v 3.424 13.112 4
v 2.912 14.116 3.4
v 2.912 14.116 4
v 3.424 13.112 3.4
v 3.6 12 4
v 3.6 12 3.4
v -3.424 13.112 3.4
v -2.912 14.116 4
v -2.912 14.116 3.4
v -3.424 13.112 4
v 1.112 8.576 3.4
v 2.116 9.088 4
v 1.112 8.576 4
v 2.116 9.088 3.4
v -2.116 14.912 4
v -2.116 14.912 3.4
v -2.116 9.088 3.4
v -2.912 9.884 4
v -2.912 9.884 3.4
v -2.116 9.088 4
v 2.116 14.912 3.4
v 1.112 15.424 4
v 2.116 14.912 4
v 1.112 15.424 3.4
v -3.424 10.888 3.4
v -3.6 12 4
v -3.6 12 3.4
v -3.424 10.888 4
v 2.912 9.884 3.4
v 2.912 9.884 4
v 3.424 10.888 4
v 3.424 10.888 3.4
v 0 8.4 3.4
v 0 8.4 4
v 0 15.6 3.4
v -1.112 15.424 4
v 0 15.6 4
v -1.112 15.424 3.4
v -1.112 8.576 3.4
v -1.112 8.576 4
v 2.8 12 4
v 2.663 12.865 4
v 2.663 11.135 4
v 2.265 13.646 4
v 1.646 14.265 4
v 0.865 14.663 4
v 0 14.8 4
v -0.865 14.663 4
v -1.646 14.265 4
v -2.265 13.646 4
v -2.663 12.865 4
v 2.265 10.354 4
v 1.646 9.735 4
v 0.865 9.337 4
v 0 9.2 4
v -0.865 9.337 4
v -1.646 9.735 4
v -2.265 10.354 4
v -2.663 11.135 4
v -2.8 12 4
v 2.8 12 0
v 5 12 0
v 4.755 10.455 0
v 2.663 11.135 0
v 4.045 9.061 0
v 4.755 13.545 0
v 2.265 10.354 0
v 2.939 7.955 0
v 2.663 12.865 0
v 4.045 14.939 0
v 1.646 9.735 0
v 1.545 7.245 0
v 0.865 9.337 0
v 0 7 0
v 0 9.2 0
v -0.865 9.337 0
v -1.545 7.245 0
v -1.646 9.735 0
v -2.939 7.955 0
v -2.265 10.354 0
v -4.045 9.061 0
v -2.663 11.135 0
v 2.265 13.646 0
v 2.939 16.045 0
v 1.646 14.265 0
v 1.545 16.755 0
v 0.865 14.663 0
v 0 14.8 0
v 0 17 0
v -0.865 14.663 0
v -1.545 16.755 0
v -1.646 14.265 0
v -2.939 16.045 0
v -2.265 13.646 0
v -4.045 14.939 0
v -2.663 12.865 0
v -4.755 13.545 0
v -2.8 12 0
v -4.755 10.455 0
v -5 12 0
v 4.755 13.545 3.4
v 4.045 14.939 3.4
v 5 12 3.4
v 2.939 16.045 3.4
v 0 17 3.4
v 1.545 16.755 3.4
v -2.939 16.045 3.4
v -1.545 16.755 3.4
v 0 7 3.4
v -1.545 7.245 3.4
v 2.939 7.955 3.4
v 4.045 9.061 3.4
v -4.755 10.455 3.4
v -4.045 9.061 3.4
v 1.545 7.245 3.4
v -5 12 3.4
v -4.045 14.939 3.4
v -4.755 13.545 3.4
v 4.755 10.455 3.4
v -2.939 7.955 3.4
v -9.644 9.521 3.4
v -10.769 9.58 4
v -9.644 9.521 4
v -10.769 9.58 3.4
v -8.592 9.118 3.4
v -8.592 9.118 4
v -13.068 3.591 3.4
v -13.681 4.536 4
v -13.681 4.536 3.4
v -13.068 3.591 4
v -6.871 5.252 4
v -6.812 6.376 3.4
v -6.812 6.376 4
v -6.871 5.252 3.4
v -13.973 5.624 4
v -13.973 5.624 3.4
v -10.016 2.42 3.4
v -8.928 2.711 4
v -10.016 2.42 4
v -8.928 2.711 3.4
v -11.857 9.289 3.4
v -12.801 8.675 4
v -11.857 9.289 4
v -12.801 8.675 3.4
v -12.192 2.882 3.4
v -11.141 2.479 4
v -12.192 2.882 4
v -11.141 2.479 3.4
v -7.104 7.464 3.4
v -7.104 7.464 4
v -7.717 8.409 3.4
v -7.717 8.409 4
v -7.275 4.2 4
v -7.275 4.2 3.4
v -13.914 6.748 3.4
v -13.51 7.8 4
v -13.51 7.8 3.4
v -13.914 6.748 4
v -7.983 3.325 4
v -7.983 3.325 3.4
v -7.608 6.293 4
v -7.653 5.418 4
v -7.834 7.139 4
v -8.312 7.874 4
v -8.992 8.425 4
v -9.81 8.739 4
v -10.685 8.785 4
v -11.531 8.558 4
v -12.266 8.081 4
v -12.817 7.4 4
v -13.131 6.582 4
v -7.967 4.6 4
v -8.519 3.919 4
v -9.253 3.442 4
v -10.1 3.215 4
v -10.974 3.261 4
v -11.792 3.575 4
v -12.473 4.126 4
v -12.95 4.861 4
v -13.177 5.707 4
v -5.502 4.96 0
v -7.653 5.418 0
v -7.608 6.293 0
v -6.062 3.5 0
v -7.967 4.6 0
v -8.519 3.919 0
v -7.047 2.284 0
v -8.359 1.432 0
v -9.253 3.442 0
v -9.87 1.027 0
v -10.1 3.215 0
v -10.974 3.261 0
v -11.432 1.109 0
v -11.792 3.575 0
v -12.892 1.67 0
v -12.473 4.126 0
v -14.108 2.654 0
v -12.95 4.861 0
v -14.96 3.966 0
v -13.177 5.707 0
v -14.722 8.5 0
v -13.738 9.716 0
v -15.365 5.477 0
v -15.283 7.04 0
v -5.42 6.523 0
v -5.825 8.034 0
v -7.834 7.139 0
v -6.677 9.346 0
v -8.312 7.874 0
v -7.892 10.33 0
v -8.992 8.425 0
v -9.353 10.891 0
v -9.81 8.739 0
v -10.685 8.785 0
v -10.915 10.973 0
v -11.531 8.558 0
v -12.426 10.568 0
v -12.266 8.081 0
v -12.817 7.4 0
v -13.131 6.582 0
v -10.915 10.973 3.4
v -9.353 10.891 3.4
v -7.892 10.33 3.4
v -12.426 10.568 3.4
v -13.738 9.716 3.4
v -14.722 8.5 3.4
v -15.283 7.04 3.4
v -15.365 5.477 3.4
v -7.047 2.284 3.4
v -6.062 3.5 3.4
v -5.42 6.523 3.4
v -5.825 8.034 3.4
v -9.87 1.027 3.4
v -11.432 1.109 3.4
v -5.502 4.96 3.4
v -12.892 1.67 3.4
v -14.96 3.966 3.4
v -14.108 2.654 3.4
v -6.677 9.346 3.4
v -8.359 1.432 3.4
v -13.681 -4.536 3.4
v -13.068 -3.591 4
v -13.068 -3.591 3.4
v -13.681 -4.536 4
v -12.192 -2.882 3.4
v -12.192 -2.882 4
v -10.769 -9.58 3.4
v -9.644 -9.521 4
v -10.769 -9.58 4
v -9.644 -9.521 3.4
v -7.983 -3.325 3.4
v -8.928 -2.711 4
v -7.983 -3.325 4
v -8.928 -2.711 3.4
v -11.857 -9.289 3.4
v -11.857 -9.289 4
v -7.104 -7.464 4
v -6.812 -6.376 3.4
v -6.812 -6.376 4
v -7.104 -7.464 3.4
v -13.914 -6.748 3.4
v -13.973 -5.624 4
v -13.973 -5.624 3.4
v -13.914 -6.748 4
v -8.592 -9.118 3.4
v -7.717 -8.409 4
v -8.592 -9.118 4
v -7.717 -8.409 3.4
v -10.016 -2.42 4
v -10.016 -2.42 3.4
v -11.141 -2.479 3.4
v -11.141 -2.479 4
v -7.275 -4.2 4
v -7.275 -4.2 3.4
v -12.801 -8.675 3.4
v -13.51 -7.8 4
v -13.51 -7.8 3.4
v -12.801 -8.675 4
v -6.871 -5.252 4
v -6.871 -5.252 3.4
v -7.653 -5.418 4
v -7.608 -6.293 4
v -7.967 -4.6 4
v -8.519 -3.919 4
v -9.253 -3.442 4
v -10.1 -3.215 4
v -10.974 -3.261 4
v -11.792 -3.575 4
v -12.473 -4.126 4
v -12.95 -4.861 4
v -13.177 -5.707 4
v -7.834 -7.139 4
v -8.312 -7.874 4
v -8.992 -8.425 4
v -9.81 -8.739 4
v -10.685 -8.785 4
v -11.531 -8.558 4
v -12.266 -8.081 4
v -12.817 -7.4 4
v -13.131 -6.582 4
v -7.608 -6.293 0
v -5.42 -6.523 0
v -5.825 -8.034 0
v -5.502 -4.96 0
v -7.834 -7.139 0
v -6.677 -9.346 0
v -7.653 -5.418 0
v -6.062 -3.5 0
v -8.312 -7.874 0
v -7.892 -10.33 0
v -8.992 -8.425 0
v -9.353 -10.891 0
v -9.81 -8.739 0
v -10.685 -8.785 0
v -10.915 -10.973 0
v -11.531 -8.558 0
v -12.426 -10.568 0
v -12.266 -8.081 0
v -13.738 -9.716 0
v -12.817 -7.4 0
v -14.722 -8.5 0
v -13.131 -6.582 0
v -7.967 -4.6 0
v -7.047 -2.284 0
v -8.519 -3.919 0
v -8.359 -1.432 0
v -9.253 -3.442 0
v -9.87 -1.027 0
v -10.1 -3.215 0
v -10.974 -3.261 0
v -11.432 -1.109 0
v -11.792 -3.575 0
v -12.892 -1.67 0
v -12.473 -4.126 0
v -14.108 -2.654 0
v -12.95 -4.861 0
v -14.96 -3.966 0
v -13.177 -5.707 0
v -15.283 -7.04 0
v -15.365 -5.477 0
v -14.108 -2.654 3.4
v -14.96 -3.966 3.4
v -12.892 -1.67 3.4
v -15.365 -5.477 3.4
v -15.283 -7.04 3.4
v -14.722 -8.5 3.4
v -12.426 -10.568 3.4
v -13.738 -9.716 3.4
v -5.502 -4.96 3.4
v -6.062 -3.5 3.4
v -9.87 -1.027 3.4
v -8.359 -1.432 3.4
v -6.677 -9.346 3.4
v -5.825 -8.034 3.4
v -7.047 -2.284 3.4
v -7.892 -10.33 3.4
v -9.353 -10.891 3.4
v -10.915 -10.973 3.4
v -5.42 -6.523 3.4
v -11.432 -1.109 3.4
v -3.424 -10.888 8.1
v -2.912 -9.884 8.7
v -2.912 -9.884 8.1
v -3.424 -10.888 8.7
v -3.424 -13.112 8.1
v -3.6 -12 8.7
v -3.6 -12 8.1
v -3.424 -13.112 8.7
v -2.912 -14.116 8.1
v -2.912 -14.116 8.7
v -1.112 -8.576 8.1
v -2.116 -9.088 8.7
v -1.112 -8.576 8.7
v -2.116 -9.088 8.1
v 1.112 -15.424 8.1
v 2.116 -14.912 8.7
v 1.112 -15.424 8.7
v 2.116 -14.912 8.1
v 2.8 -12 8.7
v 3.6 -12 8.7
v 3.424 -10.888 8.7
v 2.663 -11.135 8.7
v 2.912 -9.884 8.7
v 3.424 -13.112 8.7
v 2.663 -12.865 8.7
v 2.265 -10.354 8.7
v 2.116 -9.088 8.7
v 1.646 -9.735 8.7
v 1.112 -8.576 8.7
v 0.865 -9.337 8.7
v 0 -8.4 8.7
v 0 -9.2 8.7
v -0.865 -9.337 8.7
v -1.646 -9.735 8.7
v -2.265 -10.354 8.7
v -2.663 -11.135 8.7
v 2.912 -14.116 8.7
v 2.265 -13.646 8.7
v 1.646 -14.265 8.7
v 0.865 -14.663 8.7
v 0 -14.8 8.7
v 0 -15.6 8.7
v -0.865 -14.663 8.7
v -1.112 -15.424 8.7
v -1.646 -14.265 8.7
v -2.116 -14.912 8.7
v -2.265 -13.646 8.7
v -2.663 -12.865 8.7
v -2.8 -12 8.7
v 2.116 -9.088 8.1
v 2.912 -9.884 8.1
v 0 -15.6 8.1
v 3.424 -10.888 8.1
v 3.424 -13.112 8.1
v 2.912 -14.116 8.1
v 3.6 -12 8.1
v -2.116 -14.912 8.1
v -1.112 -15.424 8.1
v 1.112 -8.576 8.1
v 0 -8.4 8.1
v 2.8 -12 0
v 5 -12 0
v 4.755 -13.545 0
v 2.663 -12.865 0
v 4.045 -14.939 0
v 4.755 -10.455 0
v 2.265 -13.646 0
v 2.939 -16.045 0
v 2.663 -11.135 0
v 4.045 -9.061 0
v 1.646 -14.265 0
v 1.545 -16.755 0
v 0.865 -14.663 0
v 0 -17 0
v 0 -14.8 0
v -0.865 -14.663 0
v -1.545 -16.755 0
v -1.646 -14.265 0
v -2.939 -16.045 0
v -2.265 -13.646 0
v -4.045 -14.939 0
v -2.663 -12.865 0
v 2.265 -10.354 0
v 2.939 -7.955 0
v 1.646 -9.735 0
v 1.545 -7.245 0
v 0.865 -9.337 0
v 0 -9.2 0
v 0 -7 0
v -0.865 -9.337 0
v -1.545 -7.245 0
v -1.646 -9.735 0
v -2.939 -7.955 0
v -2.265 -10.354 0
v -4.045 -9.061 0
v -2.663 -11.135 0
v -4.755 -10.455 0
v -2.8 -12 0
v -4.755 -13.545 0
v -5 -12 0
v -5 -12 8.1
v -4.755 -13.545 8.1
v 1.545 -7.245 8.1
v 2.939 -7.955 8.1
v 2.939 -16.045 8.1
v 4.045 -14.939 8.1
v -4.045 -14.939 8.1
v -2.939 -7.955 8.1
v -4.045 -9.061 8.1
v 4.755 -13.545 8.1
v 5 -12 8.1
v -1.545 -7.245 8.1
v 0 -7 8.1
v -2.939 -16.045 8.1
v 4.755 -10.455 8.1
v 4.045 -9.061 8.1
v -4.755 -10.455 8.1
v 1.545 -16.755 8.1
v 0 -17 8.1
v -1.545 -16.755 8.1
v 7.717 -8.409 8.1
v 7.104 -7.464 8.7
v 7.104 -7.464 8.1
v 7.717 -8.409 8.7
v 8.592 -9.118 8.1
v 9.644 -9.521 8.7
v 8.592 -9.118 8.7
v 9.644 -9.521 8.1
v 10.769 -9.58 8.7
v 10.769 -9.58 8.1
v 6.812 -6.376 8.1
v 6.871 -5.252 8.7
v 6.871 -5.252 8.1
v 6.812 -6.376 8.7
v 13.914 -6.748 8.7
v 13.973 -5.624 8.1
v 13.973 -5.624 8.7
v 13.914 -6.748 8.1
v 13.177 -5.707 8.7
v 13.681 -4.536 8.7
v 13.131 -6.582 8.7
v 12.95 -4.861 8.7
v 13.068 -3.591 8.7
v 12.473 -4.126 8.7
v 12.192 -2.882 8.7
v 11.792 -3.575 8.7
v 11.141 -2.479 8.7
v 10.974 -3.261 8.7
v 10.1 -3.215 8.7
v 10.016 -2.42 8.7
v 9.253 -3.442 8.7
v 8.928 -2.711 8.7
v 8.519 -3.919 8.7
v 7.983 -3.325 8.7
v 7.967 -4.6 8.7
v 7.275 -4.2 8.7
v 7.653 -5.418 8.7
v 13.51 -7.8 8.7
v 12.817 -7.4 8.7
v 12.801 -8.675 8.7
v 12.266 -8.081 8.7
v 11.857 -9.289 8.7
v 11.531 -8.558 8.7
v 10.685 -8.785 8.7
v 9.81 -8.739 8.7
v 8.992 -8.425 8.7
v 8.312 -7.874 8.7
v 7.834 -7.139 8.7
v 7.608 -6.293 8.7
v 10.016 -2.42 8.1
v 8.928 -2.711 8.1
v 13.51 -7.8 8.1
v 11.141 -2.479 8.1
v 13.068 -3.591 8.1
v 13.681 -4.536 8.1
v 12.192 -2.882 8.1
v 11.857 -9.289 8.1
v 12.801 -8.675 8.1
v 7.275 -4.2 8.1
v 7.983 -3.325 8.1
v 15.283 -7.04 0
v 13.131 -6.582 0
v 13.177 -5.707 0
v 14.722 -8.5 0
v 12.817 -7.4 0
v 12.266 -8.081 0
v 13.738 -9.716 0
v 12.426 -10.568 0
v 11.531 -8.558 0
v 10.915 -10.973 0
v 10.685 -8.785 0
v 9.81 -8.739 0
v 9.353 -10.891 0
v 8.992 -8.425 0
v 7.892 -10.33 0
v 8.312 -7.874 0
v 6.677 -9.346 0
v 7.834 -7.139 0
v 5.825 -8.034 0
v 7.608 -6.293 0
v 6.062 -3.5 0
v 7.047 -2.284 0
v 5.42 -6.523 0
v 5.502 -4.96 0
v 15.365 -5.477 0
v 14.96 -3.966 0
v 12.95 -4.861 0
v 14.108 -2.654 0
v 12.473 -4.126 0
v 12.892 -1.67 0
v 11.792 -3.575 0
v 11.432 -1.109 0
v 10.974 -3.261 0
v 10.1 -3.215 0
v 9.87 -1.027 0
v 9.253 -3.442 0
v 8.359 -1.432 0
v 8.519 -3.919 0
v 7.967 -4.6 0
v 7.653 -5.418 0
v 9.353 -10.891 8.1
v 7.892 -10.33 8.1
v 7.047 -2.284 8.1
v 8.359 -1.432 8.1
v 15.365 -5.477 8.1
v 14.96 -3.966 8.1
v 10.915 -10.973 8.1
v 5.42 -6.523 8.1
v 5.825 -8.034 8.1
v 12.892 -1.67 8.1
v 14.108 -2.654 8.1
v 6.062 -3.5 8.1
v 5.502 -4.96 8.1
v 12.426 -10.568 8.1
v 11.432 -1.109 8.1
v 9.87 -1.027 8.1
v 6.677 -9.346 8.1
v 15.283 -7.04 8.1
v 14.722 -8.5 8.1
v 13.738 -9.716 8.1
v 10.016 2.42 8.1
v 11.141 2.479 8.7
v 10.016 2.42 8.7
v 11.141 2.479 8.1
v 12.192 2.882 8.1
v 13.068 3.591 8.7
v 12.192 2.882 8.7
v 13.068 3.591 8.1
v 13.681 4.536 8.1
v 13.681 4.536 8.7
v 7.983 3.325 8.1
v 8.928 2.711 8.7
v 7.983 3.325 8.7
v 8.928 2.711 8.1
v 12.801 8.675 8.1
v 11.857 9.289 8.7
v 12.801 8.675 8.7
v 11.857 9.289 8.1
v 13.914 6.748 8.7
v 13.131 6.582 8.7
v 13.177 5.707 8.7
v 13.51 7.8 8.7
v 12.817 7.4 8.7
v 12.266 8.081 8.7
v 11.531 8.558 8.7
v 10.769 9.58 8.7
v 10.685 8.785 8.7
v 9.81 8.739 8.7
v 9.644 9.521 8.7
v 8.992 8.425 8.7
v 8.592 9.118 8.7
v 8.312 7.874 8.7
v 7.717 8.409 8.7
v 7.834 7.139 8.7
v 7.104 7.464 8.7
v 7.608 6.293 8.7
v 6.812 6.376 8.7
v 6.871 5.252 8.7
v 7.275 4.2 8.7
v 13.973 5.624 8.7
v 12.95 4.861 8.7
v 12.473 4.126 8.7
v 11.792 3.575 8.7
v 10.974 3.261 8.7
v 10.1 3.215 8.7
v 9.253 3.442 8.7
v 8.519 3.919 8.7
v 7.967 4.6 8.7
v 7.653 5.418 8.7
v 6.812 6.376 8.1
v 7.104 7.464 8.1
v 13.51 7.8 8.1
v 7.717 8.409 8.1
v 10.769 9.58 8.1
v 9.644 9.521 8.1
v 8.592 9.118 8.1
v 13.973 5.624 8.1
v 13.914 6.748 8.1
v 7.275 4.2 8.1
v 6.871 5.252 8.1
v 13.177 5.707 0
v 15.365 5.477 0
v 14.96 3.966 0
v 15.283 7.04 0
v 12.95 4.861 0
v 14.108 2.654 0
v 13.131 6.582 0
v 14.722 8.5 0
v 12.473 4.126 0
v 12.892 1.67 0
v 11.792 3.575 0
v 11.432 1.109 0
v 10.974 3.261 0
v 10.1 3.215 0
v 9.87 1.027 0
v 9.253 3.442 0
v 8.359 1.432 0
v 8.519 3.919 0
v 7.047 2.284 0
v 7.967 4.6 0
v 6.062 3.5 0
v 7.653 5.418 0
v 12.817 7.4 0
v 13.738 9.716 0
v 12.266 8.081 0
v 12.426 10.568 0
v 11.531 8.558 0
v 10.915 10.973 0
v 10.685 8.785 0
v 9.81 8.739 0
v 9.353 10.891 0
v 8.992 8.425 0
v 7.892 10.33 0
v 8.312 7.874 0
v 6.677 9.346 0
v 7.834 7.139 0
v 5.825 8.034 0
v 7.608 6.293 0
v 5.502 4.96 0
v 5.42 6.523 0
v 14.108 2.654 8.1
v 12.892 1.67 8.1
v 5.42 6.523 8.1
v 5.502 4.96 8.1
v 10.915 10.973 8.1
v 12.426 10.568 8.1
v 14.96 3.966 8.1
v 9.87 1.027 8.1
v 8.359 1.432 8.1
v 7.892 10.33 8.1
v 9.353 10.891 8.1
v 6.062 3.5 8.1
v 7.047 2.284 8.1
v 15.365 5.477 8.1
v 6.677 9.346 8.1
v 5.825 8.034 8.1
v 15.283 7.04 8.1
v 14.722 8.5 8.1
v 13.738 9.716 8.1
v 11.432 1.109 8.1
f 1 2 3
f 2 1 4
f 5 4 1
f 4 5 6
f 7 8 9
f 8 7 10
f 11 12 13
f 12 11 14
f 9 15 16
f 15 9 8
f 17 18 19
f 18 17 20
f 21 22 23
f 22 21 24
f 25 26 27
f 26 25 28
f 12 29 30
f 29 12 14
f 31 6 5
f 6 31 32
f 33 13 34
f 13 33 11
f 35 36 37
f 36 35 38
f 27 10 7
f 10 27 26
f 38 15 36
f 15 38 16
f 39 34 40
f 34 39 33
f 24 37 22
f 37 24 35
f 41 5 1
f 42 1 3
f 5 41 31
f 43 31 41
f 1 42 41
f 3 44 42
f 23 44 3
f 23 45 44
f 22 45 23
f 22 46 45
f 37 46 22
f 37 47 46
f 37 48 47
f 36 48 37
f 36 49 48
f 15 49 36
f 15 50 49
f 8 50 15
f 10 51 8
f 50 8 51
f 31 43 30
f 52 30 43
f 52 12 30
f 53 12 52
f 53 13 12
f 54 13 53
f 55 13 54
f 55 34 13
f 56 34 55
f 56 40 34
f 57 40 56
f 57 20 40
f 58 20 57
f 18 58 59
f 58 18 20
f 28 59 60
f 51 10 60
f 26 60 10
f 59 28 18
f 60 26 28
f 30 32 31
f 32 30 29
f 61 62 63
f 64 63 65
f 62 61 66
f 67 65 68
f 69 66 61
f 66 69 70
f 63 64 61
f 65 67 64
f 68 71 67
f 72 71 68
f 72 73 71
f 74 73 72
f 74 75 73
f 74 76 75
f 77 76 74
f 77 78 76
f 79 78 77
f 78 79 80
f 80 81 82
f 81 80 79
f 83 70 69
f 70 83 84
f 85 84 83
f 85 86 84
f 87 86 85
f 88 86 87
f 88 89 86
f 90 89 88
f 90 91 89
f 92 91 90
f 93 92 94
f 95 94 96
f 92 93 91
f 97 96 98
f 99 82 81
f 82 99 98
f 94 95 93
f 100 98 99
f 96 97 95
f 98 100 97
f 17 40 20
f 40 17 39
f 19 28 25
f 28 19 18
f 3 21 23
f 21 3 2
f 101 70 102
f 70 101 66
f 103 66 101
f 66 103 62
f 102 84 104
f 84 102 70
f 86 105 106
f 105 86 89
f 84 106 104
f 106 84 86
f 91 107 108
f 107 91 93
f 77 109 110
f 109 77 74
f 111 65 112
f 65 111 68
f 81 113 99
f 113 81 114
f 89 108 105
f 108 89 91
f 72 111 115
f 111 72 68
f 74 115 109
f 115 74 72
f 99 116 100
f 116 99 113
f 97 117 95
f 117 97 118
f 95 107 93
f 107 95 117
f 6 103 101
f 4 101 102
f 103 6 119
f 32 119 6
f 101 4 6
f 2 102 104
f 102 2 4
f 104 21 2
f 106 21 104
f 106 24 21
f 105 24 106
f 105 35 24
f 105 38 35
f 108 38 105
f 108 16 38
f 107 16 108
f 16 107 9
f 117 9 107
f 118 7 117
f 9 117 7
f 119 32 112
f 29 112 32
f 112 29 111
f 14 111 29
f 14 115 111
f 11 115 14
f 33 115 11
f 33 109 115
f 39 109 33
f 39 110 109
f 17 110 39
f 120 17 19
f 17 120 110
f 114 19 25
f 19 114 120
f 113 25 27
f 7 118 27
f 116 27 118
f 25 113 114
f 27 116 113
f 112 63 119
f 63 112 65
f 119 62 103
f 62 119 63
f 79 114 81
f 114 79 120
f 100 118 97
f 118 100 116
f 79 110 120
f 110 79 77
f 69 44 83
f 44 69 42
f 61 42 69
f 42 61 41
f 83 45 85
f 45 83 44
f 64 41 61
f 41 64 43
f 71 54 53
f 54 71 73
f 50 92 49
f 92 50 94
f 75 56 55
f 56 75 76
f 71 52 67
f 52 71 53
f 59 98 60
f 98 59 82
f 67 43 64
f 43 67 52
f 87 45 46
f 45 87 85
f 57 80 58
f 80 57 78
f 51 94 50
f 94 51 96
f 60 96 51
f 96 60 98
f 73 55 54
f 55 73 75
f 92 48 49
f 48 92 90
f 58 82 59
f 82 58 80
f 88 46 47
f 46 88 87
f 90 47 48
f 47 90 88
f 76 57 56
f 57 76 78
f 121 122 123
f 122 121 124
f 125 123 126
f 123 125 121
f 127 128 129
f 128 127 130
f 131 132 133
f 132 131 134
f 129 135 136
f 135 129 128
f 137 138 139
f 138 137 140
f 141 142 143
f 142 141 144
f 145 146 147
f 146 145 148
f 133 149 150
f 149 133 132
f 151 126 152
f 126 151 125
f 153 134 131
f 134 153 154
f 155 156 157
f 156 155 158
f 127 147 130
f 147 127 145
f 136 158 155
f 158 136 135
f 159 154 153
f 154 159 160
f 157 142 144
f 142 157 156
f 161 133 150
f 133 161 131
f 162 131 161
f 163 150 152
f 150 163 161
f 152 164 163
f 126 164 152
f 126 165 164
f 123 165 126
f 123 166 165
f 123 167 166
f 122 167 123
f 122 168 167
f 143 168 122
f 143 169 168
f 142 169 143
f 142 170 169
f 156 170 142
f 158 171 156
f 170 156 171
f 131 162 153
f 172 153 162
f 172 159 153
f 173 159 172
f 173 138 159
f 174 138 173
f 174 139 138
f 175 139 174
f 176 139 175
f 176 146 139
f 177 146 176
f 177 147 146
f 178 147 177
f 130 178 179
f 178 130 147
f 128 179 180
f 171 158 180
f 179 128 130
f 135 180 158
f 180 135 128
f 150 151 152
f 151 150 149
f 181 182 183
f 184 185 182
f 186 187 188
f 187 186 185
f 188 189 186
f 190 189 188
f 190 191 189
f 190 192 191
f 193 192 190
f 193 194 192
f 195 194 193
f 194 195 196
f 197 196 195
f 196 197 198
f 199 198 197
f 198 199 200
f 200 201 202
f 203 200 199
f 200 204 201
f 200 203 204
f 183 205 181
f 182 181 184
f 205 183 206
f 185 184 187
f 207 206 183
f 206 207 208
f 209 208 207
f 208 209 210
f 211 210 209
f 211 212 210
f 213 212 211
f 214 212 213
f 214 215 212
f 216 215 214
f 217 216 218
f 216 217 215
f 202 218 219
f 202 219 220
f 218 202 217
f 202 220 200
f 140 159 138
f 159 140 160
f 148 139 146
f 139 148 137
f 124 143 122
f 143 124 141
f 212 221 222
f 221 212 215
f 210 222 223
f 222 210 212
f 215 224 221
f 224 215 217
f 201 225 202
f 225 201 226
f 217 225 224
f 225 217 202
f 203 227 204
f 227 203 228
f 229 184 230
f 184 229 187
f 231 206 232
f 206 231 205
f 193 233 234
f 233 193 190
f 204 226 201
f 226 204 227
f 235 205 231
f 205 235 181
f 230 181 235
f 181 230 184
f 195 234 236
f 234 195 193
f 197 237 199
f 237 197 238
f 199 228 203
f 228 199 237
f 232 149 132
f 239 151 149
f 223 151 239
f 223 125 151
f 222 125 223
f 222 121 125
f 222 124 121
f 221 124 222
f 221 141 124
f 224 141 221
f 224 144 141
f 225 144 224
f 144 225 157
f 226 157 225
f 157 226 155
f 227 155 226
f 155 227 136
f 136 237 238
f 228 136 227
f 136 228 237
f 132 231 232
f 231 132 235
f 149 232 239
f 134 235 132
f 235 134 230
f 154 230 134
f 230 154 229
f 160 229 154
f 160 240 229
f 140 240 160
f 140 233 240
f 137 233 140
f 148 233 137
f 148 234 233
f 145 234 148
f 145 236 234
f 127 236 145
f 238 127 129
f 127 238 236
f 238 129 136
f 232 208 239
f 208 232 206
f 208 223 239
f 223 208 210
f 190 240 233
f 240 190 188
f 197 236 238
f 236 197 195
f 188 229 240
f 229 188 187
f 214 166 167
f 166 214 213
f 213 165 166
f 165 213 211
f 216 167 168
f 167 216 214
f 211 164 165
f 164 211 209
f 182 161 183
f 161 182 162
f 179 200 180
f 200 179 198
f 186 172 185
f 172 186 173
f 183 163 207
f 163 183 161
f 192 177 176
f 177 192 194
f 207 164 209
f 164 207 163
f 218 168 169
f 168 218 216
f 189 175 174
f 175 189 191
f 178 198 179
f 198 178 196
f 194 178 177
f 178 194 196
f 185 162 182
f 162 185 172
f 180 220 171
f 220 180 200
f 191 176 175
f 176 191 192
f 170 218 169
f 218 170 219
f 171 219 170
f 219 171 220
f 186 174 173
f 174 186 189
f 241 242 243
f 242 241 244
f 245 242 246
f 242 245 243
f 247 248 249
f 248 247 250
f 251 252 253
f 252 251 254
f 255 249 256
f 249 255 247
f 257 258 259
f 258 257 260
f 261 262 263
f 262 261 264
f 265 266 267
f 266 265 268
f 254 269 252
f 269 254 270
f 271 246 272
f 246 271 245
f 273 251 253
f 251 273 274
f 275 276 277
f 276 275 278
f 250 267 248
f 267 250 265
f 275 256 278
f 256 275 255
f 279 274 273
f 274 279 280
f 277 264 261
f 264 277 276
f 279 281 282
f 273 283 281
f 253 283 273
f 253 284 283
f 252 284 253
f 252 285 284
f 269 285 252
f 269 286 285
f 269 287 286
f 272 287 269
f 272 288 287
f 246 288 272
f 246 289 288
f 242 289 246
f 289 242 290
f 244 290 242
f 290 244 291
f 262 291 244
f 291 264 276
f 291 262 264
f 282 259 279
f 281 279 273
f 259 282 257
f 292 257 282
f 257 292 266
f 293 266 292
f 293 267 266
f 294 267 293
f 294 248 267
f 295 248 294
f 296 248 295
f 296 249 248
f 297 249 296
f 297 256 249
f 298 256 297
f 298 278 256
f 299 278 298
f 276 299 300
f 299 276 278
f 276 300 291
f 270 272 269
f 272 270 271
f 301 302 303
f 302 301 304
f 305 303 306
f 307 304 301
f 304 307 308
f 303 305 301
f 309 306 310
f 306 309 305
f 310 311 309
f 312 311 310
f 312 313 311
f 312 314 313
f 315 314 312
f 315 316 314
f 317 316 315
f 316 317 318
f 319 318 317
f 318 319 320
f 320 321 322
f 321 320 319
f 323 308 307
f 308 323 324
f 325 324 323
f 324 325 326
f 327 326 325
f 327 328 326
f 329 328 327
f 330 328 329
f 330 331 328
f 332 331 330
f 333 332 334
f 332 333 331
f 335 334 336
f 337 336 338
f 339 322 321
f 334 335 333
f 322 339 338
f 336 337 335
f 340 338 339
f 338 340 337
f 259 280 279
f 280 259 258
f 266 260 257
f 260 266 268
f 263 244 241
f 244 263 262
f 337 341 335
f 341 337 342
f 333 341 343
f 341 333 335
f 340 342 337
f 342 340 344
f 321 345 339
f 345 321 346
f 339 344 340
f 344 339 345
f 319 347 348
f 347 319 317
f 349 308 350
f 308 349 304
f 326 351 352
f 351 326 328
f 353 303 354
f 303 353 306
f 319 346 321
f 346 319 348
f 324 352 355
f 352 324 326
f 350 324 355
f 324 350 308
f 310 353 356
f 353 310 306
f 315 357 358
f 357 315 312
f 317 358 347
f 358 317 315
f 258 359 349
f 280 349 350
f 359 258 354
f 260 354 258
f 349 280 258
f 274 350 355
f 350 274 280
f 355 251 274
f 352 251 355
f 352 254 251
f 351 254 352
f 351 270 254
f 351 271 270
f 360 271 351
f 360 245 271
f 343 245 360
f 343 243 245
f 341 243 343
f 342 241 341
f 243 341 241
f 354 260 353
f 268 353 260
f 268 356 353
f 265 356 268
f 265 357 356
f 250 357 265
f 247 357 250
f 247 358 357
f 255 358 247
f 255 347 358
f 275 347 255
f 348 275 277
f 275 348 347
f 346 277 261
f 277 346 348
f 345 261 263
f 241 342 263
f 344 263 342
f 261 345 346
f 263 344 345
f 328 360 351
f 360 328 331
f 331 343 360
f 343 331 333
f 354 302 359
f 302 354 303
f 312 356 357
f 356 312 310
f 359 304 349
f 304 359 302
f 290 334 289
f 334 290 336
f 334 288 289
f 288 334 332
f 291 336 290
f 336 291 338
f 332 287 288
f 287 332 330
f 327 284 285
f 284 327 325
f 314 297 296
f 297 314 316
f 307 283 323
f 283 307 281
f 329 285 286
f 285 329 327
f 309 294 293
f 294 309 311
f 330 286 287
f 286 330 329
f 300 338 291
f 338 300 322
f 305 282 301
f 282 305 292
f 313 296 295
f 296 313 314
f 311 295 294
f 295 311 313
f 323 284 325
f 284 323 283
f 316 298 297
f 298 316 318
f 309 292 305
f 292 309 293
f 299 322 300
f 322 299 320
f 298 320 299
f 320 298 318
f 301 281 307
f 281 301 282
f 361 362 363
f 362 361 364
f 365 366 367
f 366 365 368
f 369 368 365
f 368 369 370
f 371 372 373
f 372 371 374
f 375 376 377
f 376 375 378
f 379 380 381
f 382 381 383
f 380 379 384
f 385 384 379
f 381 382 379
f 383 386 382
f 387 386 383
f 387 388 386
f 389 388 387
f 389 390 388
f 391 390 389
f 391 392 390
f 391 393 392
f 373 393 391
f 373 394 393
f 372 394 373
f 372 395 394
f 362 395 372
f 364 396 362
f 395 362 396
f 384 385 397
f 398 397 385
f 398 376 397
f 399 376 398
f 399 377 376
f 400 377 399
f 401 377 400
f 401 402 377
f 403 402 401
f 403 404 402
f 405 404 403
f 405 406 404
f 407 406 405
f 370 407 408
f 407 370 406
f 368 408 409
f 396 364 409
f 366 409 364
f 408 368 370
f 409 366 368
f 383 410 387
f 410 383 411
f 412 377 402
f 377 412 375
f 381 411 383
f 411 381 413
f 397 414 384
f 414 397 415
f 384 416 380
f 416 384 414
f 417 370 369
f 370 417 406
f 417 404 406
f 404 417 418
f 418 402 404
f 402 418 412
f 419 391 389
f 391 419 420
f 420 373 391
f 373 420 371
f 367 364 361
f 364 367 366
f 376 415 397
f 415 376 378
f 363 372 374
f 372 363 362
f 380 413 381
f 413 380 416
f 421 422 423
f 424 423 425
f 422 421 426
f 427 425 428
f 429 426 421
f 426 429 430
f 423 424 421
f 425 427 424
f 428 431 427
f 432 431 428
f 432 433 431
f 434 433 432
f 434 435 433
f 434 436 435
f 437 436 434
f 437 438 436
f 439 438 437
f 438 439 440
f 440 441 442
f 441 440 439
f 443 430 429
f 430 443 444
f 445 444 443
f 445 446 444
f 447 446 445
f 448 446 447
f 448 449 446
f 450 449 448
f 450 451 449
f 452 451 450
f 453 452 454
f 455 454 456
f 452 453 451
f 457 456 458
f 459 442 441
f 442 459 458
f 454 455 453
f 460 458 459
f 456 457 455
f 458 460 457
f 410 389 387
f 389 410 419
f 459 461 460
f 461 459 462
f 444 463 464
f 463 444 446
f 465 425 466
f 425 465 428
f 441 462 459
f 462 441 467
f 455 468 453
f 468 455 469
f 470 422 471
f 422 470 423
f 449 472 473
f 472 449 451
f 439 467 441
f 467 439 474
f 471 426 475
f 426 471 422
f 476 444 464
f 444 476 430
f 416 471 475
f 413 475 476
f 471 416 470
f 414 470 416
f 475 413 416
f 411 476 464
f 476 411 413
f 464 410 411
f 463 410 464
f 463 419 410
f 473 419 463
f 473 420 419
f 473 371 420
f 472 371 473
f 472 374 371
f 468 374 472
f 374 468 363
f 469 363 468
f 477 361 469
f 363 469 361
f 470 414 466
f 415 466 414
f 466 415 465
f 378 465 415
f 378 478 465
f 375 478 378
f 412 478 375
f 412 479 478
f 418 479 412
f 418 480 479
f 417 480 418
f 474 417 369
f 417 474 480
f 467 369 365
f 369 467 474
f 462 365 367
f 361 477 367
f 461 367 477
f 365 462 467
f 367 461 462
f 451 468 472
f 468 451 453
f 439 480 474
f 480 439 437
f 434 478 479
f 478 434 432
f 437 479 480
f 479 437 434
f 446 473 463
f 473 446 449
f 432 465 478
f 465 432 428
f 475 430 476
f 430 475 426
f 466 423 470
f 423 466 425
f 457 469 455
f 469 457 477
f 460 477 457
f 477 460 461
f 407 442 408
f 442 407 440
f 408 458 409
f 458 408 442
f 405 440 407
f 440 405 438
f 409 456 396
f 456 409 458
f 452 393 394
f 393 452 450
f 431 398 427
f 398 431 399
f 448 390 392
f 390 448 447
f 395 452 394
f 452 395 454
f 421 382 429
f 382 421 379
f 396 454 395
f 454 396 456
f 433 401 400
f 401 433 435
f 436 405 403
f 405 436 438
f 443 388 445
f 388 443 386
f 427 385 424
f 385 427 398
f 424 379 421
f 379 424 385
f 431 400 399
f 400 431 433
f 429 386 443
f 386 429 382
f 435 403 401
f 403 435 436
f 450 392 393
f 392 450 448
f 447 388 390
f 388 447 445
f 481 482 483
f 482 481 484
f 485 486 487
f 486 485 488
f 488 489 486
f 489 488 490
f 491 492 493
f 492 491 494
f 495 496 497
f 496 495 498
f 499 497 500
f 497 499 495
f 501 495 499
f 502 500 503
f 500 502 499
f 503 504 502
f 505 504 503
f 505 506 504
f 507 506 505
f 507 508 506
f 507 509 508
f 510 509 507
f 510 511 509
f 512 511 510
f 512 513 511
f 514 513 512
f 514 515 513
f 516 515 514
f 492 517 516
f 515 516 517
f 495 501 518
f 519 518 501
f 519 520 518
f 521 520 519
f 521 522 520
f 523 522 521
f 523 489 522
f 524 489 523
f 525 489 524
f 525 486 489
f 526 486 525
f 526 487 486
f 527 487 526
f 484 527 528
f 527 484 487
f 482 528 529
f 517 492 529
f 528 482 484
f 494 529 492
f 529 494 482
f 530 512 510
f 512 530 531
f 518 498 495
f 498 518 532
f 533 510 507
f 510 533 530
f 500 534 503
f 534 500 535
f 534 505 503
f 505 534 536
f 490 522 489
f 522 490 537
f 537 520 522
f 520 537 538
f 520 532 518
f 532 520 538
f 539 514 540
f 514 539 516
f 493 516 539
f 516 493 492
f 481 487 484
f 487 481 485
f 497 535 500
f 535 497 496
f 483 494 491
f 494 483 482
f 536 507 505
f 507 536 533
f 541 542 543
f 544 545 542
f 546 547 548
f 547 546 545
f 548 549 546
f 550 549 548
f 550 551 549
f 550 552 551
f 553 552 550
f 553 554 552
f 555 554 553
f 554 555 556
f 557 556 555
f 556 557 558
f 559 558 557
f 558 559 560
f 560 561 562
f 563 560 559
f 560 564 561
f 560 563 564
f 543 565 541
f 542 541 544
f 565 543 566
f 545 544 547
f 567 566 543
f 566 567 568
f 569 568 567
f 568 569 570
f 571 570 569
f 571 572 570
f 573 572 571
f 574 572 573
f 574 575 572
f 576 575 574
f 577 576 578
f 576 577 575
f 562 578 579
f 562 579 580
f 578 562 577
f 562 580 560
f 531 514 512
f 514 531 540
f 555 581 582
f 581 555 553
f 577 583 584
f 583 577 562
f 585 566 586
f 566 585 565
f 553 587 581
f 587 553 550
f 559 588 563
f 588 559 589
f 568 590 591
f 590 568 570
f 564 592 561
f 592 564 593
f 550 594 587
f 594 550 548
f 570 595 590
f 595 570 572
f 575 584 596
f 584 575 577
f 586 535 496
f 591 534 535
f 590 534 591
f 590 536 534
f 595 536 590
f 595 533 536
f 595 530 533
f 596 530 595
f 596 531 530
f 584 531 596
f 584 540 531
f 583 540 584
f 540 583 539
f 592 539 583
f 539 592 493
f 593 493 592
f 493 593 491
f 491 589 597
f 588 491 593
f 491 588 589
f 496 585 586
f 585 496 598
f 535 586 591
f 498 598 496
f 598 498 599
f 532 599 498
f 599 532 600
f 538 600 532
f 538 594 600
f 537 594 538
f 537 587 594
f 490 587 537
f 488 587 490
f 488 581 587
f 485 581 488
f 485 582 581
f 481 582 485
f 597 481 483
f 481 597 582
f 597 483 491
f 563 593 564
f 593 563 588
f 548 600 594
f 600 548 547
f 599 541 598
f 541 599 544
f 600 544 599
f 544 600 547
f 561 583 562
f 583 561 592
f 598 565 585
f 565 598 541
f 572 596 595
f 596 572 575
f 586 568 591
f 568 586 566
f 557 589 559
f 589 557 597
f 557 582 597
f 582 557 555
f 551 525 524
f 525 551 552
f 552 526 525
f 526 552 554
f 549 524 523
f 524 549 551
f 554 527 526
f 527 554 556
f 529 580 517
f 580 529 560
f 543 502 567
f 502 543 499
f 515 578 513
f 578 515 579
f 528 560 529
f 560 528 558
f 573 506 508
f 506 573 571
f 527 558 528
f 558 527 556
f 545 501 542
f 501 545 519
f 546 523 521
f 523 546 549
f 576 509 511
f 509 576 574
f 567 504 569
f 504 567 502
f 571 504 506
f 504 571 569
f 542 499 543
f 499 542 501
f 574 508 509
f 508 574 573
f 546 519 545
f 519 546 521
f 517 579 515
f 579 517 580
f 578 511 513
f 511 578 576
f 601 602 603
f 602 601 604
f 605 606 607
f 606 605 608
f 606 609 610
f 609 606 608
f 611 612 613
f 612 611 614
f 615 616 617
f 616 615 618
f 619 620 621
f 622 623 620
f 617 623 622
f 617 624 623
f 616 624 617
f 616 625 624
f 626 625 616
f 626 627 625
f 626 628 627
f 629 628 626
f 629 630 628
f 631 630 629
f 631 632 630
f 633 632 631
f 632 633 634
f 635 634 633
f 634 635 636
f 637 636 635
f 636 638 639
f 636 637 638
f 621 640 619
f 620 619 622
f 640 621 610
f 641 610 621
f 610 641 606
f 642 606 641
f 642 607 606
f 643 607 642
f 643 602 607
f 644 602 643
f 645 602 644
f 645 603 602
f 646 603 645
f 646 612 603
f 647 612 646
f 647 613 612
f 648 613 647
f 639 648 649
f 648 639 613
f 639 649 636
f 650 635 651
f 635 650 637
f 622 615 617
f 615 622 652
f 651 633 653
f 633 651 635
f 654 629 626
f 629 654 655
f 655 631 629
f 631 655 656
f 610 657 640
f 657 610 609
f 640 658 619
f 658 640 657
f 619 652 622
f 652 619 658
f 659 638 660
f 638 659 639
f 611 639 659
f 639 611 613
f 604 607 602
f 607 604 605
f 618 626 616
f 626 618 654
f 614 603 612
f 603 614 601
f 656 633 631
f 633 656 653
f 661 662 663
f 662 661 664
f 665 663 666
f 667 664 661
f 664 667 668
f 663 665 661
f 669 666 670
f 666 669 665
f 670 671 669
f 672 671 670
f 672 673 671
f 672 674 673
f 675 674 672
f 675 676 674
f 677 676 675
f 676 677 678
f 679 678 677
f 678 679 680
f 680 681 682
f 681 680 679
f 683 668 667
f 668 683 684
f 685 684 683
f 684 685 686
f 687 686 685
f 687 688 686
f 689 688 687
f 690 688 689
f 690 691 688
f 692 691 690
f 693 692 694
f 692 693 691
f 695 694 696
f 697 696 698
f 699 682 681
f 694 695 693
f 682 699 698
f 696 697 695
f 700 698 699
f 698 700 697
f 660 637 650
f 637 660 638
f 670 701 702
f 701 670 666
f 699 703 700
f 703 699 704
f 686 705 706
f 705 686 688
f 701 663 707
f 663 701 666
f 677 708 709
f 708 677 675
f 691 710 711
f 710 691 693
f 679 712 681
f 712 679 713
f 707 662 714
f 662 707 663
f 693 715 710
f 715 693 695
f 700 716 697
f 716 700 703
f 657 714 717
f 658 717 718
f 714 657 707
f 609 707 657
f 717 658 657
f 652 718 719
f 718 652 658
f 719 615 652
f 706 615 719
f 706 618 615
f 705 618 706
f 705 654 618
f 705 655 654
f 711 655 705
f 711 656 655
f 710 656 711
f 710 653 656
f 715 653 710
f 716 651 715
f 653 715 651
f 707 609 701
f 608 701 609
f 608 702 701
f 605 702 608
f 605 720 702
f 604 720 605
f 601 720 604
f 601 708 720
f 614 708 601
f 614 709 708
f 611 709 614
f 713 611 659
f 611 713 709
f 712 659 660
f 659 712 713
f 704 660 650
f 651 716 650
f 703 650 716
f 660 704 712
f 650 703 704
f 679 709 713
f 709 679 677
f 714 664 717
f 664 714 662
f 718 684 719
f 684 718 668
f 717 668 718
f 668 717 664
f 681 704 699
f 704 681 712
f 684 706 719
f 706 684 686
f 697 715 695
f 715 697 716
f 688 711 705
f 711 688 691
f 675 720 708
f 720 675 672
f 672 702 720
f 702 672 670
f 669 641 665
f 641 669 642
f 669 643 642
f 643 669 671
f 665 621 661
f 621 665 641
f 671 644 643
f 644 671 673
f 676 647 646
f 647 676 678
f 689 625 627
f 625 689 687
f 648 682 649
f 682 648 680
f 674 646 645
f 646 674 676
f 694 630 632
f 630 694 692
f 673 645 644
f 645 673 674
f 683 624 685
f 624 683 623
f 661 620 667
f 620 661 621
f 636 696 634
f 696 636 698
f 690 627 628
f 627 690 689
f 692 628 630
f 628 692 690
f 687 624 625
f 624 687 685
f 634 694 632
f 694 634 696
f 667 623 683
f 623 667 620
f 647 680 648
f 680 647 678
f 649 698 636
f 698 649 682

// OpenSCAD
tot_height = 22.7-10 ;
short_height = 4 ;

diff_height = tot_height - 2*short_height;

echo(short_height);
echo(short_height+diff_height);

for( i=[0:1] ) for( j=[0:2] ) rotate([0,0,i*180+j*60]) translate([0,12,0]) difference(){
	union() {
		cylinder( r = 3.6, h = short_height+i*diff_height, $fn = 20 );
		cylinder( r = 5, h = short_height+i*diff_height-0.6, $fn = 20 );
	}
	translate([0,0,-0.1]) union() {
		cylinder( r = 2.8, h = 2*tot_height, $fn = 20 );
	}
}
